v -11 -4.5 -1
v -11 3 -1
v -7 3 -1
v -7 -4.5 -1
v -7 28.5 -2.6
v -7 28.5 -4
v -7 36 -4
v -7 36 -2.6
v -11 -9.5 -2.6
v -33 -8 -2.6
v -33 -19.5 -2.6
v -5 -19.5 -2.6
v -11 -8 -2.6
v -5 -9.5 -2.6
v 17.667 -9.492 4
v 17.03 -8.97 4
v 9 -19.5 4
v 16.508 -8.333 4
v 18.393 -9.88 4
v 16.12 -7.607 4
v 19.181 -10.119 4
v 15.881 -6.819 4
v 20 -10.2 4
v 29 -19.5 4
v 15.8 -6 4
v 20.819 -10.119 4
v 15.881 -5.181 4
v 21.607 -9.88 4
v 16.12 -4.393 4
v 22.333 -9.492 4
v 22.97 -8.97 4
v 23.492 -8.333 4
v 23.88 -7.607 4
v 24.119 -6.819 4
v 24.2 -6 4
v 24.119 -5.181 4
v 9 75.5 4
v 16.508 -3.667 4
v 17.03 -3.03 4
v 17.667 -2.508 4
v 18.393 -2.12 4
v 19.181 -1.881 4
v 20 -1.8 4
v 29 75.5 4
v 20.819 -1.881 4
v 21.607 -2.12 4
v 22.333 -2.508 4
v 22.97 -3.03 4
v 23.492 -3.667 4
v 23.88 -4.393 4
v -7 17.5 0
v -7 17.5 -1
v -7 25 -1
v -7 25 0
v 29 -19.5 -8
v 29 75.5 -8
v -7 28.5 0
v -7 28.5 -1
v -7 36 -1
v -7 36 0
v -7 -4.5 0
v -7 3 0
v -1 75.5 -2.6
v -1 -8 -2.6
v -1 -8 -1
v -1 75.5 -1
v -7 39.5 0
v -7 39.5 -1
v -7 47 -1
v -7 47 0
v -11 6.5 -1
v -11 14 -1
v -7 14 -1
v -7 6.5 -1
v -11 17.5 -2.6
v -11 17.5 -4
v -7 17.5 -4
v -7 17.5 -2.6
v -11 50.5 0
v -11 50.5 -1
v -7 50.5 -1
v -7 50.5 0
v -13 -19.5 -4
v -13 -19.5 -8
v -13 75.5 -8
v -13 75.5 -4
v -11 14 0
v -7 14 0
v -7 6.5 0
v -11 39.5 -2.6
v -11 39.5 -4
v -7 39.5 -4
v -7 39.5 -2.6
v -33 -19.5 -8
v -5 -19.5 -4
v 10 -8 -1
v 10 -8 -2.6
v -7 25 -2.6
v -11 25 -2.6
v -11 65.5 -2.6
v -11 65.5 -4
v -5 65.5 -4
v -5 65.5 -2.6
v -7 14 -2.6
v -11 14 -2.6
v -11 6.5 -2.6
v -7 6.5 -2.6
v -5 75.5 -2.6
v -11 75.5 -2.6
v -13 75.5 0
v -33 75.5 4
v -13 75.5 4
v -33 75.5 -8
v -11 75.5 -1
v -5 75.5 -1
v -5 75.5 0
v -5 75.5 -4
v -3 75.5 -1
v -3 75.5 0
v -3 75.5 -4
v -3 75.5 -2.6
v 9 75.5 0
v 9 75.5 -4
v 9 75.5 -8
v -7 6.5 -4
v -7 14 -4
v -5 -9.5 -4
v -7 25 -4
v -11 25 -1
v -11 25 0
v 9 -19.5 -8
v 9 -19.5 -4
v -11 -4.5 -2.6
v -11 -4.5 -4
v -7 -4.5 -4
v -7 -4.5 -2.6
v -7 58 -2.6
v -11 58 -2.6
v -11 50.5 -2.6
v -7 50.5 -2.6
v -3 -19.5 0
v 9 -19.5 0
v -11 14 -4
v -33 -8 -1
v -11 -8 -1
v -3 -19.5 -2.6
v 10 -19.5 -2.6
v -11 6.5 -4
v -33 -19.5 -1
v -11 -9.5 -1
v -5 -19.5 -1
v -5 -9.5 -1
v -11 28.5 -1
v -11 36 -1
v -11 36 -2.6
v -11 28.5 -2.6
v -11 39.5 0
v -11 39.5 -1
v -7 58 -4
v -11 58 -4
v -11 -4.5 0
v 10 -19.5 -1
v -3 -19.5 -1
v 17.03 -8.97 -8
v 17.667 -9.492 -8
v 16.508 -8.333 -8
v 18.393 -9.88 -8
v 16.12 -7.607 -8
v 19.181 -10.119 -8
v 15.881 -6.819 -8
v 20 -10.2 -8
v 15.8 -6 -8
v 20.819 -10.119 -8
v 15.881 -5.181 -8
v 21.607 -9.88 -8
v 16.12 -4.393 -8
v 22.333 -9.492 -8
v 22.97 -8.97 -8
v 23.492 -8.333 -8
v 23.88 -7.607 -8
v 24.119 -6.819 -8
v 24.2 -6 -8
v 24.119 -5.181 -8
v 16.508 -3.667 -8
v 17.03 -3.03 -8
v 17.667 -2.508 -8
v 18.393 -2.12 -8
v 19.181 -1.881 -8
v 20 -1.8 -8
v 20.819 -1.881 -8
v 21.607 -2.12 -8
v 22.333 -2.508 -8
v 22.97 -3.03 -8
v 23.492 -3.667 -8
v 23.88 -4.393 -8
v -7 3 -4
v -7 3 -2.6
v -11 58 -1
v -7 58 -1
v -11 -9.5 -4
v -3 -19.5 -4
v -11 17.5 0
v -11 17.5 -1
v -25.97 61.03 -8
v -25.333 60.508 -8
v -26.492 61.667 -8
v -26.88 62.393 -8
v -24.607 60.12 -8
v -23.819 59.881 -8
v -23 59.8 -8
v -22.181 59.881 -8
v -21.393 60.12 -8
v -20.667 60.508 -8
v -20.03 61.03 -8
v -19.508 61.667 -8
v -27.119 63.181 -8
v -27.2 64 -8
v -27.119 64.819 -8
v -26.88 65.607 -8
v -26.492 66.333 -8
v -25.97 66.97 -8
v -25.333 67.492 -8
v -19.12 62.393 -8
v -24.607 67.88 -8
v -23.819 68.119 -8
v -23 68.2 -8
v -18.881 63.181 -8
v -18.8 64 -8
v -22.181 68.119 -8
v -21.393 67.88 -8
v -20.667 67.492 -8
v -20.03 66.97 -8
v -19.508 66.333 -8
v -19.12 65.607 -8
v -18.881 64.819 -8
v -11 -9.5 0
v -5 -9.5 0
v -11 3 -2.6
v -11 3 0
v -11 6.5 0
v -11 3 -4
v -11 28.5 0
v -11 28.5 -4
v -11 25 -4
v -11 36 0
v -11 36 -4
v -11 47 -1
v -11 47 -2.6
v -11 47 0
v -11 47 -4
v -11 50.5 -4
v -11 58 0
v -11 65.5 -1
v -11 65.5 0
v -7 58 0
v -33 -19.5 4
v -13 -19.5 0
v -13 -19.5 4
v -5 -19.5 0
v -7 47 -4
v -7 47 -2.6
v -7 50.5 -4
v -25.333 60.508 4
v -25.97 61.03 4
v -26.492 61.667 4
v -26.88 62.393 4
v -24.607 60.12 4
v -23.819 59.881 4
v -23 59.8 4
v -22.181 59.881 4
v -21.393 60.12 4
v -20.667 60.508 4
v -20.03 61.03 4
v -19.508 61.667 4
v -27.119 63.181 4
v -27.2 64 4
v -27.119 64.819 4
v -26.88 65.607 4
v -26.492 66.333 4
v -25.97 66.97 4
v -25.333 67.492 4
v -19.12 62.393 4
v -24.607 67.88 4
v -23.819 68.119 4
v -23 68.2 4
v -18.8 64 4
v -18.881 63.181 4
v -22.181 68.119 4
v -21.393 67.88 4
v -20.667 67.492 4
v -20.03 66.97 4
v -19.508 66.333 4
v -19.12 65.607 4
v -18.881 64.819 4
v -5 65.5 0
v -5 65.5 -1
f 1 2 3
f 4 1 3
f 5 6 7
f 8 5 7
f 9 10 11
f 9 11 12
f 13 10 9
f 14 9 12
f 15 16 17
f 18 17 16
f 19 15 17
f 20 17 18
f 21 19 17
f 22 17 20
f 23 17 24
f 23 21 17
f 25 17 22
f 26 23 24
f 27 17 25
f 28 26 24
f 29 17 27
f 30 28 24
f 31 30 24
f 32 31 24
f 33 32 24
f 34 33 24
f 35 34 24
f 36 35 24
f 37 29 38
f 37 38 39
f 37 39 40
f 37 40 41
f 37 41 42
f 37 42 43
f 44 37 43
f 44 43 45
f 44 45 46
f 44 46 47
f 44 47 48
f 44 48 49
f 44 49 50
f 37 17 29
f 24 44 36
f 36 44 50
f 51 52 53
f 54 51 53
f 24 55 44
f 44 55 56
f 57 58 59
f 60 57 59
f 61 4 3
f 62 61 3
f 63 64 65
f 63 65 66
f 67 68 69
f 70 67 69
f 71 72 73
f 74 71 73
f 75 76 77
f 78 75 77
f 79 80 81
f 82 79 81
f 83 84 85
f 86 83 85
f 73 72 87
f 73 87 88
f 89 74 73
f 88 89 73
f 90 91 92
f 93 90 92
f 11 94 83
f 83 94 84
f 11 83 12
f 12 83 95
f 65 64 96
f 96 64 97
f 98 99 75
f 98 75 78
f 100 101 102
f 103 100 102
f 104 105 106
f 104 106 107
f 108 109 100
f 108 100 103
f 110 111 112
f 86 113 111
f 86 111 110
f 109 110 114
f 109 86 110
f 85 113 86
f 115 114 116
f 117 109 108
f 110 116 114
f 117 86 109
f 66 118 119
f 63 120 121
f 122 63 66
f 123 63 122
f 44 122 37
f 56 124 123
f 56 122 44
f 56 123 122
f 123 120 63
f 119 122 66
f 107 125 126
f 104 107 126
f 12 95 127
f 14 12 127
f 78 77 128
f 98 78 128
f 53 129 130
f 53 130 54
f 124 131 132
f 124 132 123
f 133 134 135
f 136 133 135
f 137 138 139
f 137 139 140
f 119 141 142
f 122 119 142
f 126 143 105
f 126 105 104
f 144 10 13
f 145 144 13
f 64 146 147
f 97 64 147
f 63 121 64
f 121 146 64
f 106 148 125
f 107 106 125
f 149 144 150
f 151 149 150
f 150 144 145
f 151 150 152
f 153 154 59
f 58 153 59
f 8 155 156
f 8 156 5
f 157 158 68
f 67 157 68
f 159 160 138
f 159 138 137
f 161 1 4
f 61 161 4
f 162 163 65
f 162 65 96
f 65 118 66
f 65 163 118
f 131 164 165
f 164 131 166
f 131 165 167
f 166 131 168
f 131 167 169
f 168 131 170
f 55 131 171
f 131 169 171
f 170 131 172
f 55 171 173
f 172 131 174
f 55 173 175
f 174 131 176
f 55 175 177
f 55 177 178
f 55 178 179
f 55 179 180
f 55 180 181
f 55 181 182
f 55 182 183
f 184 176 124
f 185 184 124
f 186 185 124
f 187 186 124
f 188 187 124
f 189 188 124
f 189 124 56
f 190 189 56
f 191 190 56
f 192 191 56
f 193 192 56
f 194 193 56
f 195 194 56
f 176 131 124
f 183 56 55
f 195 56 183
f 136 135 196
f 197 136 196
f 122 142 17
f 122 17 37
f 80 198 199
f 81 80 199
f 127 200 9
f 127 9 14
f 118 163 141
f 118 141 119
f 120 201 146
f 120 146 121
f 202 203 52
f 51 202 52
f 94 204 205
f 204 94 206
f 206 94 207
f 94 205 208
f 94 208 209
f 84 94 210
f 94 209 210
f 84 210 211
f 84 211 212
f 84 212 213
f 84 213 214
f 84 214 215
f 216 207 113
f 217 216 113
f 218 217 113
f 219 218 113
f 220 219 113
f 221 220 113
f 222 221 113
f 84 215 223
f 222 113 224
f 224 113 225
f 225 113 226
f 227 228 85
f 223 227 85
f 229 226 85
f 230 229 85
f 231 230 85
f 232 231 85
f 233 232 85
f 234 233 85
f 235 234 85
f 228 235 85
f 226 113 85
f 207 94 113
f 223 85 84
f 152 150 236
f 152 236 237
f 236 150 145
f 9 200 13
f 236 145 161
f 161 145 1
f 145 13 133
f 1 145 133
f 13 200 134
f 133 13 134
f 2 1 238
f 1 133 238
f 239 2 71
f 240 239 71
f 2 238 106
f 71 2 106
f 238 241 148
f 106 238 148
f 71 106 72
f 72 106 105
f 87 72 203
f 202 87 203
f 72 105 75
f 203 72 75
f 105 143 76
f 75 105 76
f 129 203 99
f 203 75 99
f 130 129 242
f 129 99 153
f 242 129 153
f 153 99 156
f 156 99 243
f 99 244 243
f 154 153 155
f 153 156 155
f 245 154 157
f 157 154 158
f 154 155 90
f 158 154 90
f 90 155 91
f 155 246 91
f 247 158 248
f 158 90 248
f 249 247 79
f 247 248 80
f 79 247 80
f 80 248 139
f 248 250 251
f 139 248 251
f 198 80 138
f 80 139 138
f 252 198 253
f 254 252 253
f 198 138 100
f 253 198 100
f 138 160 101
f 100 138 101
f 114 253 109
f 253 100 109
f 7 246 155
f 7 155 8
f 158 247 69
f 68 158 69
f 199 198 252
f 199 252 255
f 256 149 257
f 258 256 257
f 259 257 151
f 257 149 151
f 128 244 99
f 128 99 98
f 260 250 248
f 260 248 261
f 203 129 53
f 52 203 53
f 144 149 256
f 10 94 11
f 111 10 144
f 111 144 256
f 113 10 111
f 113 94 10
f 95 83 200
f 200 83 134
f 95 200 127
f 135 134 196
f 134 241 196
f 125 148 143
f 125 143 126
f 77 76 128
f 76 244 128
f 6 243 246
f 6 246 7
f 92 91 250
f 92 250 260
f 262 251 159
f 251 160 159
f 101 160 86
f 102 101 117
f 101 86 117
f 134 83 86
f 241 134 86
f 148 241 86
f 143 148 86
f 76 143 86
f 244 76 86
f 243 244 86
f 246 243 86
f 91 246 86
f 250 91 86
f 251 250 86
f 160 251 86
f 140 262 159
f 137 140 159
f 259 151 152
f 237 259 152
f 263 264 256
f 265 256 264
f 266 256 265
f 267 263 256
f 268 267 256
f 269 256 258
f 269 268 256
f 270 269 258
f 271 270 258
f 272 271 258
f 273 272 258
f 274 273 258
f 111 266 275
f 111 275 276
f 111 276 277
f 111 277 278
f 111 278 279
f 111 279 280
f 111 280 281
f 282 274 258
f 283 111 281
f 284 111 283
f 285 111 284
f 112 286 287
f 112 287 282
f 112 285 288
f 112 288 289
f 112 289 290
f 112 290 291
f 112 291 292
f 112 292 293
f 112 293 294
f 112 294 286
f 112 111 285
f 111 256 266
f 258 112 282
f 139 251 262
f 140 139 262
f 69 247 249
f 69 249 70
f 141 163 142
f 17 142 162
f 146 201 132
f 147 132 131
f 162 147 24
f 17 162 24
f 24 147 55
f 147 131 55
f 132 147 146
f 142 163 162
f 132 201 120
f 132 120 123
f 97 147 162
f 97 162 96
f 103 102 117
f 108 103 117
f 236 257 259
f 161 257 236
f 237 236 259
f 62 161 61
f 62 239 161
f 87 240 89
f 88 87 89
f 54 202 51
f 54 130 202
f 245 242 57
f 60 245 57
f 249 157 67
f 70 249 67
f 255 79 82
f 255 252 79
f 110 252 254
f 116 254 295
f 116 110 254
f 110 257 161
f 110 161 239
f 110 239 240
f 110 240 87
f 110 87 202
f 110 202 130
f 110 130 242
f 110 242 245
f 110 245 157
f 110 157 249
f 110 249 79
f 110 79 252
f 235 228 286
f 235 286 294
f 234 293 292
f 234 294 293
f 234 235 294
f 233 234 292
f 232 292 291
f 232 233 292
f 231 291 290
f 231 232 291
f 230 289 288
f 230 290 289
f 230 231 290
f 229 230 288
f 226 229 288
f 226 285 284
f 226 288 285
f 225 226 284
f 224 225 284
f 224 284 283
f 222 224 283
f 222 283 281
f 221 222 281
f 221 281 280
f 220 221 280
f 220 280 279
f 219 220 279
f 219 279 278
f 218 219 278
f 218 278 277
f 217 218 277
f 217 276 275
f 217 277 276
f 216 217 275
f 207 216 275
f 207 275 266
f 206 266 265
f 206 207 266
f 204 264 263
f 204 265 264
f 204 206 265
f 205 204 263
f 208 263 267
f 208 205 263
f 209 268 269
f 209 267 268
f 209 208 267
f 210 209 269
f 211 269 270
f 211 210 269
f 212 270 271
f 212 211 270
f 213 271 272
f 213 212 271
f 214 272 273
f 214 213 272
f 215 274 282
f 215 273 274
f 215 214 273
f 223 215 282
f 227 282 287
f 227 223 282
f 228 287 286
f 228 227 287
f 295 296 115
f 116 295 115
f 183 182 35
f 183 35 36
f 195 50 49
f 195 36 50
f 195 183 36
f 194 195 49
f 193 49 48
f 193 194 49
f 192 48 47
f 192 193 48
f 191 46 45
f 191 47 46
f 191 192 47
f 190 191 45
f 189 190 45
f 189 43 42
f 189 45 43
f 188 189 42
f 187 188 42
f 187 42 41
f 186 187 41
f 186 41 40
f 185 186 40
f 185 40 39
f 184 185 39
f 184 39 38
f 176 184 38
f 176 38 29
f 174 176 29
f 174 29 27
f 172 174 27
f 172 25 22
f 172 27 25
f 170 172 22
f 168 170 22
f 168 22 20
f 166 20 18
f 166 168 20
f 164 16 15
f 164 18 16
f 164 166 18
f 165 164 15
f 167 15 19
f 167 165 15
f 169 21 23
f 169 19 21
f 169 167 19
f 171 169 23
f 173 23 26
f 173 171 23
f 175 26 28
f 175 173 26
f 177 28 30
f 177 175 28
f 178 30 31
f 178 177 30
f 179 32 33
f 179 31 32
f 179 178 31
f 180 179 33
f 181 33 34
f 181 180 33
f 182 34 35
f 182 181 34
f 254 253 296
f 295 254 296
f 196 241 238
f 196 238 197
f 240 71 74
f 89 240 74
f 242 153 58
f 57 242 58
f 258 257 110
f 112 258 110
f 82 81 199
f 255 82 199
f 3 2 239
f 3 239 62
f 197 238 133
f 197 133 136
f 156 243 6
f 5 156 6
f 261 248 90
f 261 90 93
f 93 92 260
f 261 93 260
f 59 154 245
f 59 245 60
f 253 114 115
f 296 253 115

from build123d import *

# Parameters (mm, degrees)
BOX012_W          = 10
BOX012_H          = 95
BOX012_DEPTH      = 1.6
BOX013_W          = 50
BOX013_H          = 12
BOX013_DEPTH      = 1.6
CYLINDER_R        = 4.2
CYLINDER_DEPTH    = 20
CYLINDER001_R     = 4.2
CYLINDER001_DEPTH = 20
BOX009_W          = 20
BOX009_H          = 95
BOX009_DEPTH      = 12
BOX004_W          = 6
BOX004_H          = 10
BOX004_DEPTH      = 4
BOX001_W          = 4
BOX001_H          = 7.5
BOX001_DEPTH      = 4
ARRAY002_Y_COUNT  = 6
ARRAY002_Y_PITCH  = 11
BOX002_W          = 22
BOX002_H          = 95
BOX002_DEPTH      = 4
BOX005_W          = 6
BOX005_H          = 10
BOX005_DEPTH      = 4
BOX_W             = 32
BOX_H             = 95
BOX_DEPTH         = 4
BOX010_W          = 20
BOX010_H          = 95
BOX010_DEPTH      = 12


with BuildPart() as box012:
    # Box012 → Box012 (new body)
    with BuildSketch(Plane(origin=(-11, -19, -2.6), x_dir=(1, 0, 0), z_dir=(0, 0, 1))):
        with Locations((5, 47.5)):
            Rectangle(BOX012_W, BOX012_H)
    extrude(amount=BOX012_DEPTH)


with BuildPart() as fusion002006:
    # Box013 → Box013 (new body)
    with BuildSketch(Plane(origin=(-40, -20, -2.6), x_dir=(1, 0, 0), z_dir=(0, 0, 1))):
        with Locations((25, 6)):
            Rectangle(BOX013_W, BOX013_H)
    extrude(amount=BOX013_DEPTH)

    # Fusion002006: union Box012
    add(box012.part)


with BuildPart() as cylinder:
    # Cylinder → Cylinder (new body)
    with BuildSketch(Plane(origin=(20, -6, -10), x_dir=(1, 0, 0), z_dir=(0, 0, 1))):
        Circle(CYLINDER_R)
    extrude(amount=CYLINDER_DEPTH)


with BuildPart() as fusion002005:
    # Cylinder001 → Cylinder001 (new body)
    with BuildSketch(Plane(origin=(-23, 64, -10), x_dir=(1, 0, 0), z_dir=(0, 0, 1))):
        Circle(CYLINDER001_R)
    extrude(amount=CYLINDER001_DEPTH)

    # Fusion002005: union Cylinder
    add(cylinder.part)


with BuildPart() as box009:
    # Box009 → Box009 (new body)
    with BuildSketch(Plane(origin=(9, -19.5, -8), x_dir=(1, 0, 0), z_dir=(0, 0, 1))):
        with Locations((10, 47.5)):
            Rectangle(BOX009_W, BOX009_H)
    extrude(amount=BOX009_DEPTH)


with BuildPart() as tvs:
    # Box004 → Box004 (new body)
    with BuildSketch(Plane(origin=(-11, -19.5, -4), x_dir=(1, 0, 0), z_dir=(0, 0, 1))):
        with Locations((3, 5)):
            Rectangle(BOX004_W, BOX004_H)
    extrude(amount=BOX004_DEPTH)


with BuildPart() as array002:
    # Box001 → Box001 (new body)
    with BuildSketch(Plane(origin=(-11, 50.5, -4), x_dir=(1, 0, 0), z_dir=(0, 0, 1))):
        with Locations((2, 3.75)):
            Rectangle(BOX001_W, BOX001_H)
    extrude(amount=BOX001_DEPTH)

    # Array002 Y: Array002 ×6


with BuildPart() as array002_1:
    add(array002.part)
    with Locations(*[(0, -i * ARRAY002_Y_PITCH, 0) for i in range(1, ARRAY002_Y_COUNT)]):
        add(array002.part)


with BuildPart() as fusion:
    # Box002 → Box002 (new body)
    with BuildSketch(Plane(origin=(-33, -19.5, -4), x_dir=(1, 0, 0), z_dir=(0, 0, 1))):
        with Locations((11, 47.5)):
            Rectangle(BOX002_W, BOX002_H)
    extrude(amount=BOX002_DEPTH)

    # Fusion: union Array002
    add(array002_1.part)


with BuildPart() as fusion001:
    # Box005 → Box005 (new body)
    with BuildSketch(Plane(origin=(-11, 65.5, -4), x_dir=(1, 0, 0), z_dir=(0, 0, 1))):
        with Locations((3, 5)):
            Rectangle(BOX005_W, BOX005_H)
    extrude(amount=BOX005_DEPTH)

    # Fusion001: union tvs, Fusion
    add(tvs.part)
    add(fusion.part)


with BuildPart() as fusion002:
    # Box → Box (new body)
    with BuildSketch(Plane(origin=(-3, -19.5, -4), x_dir=(1, 0, 0), z_dir=(0, 0, 1))):
        with Locations((16, 47.5)):
            Rectangle(BOX_W, BOX_H)
    extrude(amount=BOX_DEPTH)

    # Fusion002: union Fusion001
    add(fusion001.part)


with BuildPart() as cut002:
    # Box010 → Box010 (new body)
    with BuildSketch(Plane(origin=(-33, -19.5, -8), x_dir=(1, 0, 0), z_dir=(0, 0, 1))):
        with Locations((10, 47.5)):
            Rectangle(BOX010_W, BOX010_H)
    extrude(amount=BOX010_DEPTH)

    # Fusion002003: union Box009, Fusion002
    add(box009.part)
    add(fusion002.part)

    # Cut001: cut Fusion002005
    add(fusion002005.part, mode=Mode.SUBTRACT)

    # Cut002: cut Fusion002006
    add(fusion002006.part, mode=Mode.SUBTRACT)


solid = cut002.part
